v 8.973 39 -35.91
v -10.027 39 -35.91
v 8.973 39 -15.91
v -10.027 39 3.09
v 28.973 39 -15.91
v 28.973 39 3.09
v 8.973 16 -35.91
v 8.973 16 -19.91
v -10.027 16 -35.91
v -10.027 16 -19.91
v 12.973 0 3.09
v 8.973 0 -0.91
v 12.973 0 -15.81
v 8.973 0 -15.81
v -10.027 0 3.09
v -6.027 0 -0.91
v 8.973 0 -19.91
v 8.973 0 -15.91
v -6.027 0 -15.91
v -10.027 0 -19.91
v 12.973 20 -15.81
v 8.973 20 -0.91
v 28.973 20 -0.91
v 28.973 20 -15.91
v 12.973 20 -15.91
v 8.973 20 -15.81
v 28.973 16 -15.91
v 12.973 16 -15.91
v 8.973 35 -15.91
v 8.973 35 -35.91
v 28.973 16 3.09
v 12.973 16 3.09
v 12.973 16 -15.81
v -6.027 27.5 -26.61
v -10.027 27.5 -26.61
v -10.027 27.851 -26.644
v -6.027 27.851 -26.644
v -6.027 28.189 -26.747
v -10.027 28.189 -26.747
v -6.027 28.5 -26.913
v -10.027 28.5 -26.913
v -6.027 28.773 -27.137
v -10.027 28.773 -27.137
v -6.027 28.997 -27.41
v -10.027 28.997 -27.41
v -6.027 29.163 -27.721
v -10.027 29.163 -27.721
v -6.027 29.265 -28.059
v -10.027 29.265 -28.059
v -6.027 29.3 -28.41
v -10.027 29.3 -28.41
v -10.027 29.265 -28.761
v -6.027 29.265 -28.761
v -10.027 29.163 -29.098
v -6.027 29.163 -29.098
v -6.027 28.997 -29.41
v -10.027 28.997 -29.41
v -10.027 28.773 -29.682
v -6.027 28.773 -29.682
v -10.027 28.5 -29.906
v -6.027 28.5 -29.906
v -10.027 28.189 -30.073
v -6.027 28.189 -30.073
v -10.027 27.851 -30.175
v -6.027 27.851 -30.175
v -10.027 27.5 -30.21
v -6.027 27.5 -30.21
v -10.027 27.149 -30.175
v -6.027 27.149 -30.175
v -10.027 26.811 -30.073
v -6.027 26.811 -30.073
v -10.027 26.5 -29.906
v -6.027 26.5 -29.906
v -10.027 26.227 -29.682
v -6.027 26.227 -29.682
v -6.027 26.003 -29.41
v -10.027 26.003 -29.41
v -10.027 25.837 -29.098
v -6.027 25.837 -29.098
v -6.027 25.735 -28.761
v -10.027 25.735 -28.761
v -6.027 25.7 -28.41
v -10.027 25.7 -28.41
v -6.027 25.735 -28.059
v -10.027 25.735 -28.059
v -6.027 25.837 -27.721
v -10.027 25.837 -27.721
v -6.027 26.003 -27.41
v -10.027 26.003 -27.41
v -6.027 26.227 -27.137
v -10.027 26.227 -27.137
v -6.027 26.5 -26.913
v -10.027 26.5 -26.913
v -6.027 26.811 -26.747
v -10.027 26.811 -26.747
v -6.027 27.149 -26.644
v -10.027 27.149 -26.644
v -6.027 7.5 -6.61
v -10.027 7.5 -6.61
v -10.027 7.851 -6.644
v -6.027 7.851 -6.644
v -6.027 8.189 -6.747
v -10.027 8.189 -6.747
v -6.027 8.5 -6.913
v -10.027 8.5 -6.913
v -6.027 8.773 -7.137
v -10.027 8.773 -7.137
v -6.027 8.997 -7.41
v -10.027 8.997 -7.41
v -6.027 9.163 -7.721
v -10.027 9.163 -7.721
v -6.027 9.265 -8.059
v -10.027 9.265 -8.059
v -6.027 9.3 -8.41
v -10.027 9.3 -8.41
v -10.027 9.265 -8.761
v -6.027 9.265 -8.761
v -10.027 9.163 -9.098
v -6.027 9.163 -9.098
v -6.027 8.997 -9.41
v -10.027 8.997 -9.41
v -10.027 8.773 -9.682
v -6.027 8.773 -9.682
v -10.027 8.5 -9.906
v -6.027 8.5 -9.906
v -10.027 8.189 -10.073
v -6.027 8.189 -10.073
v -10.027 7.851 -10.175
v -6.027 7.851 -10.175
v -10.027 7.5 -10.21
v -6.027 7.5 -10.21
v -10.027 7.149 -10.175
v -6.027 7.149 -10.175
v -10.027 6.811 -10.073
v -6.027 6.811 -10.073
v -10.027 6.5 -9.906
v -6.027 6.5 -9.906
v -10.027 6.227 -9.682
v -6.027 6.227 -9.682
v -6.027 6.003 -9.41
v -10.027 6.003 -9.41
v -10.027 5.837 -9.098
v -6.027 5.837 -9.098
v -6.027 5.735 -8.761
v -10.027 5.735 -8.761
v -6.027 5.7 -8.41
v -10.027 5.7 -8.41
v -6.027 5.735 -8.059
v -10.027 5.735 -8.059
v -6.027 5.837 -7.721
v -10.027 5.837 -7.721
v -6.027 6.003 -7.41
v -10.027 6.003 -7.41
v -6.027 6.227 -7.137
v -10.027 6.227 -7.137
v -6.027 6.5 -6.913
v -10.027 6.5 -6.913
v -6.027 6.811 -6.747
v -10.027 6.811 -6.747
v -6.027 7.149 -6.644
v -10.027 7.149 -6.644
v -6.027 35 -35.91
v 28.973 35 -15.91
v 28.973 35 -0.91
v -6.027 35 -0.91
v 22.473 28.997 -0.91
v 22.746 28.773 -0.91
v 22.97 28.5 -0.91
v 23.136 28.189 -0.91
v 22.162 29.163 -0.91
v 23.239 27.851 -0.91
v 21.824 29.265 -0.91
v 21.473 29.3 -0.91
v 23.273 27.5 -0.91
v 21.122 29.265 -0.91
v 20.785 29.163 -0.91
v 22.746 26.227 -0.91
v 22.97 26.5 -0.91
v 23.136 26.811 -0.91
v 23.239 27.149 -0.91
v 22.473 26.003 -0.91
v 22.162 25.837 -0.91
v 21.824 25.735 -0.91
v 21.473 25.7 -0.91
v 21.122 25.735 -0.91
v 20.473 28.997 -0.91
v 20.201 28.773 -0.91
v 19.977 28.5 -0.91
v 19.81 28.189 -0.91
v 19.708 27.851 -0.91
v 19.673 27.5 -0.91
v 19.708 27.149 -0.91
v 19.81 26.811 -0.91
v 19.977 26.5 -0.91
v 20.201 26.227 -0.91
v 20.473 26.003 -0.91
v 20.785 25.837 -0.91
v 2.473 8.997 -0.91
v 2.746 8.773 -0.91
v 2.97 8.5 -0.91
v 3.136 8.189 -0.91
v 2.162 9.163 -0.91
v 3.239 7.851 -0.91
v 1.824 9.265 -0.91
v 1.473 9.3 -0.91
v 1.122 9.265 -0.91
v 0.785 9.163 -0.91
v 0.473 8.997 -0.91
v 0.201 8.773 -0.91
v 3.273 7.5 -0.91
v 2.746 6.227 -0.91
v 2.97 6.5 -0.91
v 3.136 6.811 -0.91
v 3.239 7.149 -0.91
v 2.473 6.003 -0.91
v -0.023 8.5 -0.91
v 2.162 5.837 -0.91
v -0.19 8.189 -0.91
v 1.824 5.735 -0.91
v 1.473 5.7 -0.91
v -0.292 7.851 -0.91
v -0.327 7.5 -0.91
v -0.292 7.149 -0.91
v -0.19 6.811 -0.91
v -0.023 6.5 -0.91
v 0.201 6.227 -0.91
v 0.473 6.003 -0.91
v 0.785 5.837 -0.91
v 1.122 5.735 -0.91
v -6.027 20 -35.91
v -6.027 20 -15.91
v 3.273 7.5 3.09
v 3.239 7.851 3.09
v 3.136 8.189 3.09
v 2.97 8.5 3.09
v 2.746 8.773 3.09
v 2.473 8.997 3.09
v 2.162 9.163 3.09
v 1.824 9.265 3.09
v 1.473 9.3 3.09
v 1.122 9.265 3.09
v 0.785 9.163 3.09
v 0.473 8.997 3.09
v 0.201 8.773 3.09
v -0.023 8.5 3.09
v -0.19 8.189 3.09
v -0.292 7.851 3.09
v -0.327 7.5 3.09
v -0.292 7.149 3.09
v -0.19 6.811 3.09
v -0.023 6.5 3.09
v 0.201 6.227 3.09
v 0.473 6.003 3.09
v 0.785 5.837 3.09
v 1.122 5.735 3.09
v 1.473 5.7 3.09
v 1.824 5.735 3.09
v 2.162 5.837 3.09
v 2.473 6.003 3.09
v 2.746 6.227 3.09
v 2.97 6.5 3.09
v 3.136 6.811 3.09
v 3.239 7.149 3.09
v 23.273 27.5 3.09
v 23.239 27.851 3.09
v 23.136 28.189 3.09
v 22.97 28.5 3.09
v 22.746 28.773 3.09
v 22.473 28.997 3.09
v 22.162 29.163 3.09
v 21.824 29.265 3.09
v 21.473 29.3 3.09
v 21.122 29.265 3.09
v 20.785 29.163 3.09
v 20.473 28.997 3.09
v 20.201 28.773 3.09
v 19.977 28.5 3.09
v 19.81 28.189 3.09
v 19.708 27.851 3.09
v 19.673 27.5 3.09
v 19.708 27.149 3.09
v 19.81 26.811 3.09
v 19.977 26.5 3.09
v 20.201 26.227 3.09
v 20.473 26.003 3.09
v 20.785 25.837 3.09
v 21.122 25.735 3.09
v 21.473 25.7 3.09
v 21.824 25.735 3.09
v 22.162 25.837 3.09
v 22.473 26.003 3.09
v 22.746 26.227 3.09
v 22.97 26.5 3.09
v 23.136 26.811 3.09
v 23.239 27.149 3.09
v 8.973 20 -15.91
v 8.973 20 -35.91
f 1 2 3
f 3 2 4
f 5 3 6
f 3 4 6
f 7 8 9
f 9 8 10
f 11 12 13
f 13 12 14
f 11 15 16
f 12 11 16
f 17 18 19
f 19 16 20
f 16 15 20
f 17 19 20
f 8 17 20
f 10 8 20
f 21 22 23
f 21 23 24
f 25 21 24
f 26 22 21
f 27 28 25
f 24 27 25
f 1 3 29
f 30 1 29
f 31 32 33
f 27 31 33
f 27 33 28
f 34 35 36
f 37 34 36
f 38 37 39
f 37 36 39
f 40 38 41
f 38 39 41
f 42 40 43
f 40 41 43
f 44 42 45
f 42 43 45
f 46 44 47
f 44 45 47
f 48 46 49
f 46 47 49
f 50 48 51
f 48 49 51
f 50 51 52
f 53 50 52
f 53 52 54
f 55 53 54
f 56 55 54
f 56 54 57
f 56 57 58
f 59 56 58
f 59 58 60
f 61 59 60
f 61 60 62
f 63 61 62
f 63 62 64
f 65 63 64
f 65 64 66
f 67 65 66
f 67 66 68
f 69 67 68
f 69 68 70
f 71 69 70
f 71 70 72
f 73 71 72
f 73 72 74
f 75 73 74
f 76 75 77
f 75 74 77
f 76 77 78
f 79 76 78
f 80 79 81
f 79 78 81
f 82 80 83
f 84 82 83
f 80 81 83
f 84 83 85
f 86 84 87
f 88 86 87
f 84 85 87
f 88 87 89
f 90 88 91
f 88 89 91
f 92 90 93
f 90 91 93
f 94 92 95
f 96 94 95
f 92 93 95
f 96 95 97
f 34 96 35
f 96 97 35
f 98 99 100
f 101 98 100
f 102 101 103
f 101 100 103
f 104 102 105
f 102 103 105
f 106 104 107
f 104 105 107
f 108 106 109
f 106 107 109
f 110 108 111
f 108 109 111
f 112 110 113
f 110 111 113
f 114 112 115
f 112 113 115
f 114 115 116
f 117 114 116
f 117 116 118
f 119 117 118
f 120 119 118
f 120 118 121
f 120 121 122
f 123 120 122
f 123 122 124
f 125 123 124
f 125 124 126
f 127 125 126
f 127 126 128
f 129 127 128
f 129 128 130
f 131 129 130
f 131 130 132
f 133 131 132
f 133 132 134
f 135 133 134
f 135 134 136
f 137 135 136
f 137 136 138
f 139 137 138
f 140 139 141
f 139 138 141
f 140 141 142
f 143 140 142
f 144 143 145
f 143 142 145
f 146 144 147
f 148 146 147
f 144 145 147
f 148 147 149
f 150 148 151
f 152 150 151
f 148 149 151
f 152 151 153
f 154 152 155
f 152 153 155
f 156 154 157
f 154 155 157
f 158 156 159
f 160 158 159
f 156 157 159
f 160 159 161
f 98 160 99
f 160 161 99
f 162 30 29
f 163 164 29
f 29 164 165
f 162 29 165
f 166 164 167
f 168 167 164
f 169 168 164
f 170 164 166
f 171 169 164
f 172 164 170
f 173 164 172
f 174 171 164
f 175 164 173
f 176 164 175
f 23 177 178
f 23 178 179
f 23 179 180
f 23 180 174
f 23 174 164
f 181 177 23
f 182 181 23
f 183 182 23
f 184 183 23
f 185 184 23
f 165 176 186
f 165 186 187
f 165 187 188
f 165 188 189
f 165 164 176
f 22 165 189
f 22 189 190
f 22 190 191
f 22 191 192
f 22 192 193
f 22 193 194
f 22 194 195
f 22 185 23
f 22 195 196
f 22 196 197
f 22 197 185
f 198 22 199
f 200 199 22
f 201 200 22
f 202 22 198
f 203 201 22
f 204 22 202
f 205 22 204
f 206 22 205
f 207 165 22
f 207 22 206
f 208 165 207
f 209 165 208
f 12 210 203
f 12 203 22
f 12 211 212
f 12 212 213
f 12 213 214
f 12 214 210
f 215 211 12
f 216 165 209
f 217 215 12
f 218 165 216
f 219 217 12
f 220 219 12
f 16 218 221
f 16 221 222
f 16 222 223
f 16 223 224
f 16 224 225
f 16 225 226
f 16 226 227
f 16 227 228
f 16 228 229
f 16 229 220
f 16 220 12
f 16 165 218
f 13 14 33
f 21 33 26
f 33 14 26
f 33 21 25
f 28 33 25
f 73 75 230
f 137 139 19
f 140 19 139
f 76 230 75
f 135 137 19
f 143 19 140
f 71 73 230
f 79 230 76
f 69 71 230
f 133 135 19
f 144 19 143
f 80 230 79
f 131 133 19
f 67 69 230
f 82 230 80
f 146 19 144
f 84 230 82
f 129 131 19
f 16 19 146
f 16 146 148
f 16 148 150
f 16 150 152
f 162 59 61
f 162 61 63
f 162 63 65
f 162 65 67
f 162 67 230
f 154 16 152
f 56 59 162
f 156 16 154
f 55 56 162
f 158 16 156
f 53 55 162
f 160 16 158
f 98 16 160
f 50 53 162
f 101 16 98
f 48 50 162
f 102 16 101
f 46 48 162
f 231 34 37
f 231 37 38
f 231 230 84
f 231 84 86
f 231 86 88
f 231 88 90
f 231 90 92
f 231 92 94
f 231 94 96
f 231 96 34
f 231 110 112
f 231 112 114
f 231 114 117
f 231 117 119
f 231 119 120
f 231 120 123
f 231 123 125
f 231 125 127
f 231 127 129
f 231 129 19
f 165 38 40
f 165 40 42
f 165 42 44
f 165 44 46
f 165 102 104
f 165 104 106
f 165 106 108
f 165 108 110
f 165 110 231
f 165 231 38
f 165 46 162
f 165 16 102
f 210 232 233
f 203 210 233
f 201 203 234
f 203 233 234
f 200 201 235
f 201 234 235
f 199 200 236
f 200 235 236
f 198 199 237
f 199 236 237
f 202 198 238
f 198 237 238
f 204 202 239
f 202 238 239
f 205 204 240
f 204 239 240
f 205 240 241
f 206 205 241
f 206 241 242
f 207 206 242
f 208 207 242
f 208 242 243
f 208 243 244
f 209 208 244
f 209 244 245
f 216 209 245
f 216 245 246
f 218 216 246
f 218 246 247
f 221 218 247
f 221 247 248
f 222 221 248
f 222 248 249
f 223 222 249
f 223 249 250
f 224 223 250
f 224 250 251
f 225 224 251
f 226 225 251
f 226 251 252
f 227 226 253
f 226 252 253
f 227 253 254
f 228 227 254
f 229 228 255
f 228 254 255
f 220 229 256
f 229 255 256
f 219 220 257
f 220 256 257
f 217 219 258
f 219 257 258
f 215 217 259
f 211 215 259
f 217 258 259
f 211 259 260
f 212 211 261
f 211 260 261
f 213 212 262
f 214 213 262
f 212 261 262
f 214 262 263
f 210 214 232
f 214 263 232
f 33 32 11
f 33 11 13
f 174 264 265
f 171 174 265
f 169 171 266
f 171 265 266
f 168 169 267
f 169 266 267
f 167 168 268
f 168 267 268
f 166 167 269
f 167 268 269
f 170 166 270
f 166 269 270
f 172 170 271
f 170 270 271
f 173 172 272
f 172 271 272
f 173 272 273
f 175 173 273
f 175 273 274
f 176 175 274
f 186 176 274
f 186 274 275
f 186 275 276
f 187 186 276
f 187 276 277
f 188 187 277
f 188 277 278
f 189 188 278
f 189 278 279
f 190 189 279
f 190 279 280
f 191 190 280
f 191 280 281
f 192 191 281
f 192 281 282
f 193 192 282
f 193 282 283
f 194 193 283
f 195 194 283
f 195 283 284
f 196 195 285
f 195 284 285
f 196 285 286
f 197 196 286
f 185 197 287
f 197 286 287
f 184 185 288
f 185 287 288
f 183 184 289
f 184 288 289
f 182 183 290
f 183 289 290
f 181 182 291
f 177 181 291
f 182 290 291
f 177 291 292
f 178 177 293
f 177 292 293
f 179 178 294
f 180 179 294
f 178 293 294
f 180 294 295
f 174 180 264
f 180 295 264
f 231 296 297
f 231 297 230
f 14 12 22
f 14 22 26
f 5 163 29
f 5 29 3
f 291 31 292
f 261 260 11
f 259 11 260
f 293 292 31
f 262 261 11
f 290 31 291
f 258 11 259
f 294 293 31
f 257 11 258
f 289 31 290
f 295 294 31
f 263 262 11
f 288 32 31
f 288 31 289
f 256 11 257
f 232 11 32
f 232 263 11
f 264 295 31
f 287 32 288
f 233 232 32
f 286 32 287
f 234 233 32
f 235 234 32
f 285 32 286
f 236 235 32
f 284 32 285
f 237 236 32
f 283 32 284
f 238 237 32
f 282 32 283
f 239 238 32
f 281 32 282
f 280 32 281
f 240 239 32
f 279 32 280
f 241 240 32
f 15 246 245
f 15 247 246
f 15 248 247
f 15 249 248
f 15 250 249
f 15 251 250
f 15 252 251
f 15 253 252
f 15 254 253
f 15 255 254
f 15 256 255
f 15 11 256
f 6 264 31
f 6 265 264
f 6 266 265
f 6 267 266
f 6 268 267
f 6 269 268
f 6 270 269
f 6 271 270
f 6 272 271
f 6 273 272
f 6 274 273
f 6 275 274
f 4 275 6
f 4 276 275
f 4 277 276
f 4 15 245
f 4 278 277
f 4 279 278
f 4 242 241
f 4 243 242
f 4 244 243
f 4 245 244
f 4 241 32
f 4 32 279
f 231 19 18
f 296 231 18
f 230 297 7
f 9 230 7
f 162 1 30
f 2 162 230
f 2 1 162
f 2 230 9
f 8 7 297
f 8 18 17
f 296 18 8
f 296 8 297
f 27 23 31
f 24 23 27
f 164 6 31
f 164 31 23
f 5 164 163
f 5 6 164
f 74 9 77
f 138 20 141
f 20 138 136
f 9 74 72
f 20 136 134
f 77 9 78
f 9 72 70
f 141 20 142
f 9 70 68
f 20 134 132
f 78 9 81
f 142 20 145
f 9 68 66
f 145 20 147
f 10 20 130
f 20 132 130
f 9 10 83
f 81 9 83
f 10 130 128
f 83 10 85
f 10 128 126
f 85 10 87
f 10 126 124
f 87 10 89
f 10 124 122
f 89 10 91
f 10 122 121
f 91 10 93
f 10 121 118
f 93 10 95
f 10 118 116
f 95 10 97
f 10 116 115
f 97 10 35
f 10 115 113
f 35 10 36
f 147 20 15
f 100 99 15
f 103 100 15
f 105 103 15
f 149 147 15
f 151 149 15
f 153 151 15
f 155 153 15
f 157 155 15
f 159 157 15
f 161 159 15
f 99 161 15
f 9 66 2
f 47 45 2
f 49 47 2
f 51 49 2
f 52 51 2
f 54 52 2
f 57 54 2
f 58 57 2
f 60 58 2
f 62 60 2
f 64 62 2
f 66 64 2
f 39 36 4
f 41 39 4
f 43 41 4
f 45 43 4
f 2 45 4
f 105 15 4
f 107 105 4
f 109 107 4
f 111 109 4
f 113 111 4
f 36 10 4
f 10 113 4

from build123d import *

# Parameters (mm, degrees)
EXTRUDE_1_DEPTH      = 20
SKETCH_2_W           = 18.9
SKETCH_2_H           = 20
EXTRUDE_2_DEPTH      = 4
SKETCH_3_W           = 15
SKETCH_3_H           = 4
EXTRUDE_3_DEPTH      = 39
SKETCH_4_W           = 19
SKETCH_4_H           = 4
EXTRUDE_4_DEPTH      = 16
SKETCH_5_W           = 4
SKETCH_5_H           = 15
EXTRUDE_5_DEPTH      = 20
EXTRUDE_5_DEPTH_BACK = 15
SKETCH_6_W           = 19
SKETCH_6_H           = 4
EXTRUDE_6_DEPTH      = 16
SKETCH_7_R           = 1.8
CUT_EXTRUDE_1_DEPTH  = 16
SKETCH_8_R           = 1.8
CUT_EXTRUDE_2_DEPTH  = 16
SKETCH_9_R           = 1.8
CUT_EXTRUDE_3_DEPTH  = 16


with BuildPart() as part:
    # 草图1 → 凸台-拉伸1 (new body)
    with BuildSketch(Plane(origin=(0, 0, 0), x_dir=(1, 0, 0), z_dir=(0, 1, 0))):
        Polygon((8.973333333, -3.090335191), (8.973333333, 0.909664809), (-6.026666667, 0.909664809), (-6.026666667, 15.909664809), (8.973333333, 15.909664809), (8.973333333, 19.909664809), (-4.573333333, 19.909664809), (-10.026666667, 19.909664809), (-10.026666667, 0.495974831), (-10.026666667, -3.090335191), align=None)
    extrude(amount=EXTRUDE_1_DEPTH)



with BuildPart() as body_2:
    # 草图2 → 凸台-拉伸2 (new body)
    with BuildSketch(Plane(origin=(8.973333333, 0, 0), x_dir=(0, 0, -1), z_dir=(1, 0, 0))):
        with Locations((6.359664809, 10)):
            Rectangle(SKETCH_2_W, SKETCH_2_H)
    extrude(amount=EXTRUDE_2_DEPTH)


with BuildPart() as part_1:
    add(part.part)

    add(body_2.part)  # 凸台-拉伸3 merges body 2
    # 草图3 → 凸台-拉伸3 (add)
    with BuildSketch(Plane.ZY.offset(10.026666667)):
        with Locations((-8.409664809, 37)):
            Rectangle(SKETCH_3_W, SKETCH_3_H)
        Polygon((-0.909664809, 20), (3.090335191, 20), (3.090335191, 39), (-0.909664809, 39), (-0.909664809, 35), align=None)
    extrude(amount=-EXTRUDE_3_DEPTH)

    # 草图4 → 凸台-拉伸4 (add)
    with BuildSketch(Plane(origin=(12.973333333, 0, 0), x_dir=(0, 0, -1), z_dir=(1, 0, 0))):
        with Locations((6.409664809, 18)):
            Rectangle(SKETCH_4_W, SKETCH_4_H)
    extrude(amount=EXTRUDE_4_DEPTH)

    # 草图5 → 凸台-拉伸5 (add, two sides)
    with BuildSketch(Plane(origin=(0, 0, -15.909664809), x_dir=(-1, 0, 0), z_dir=(0, 0, -1))) as extrude_5_sk:
        Polygon((6.026666667, 35), (10.026666667, 35), (10.026666667, 39), (-8.973333333, 39), (-8.973333333, 35), align=None)
        with Locations((8.026666667, 27.5)):
            Rectangle(SKETCH_5_W, SKETCH_5_H)
    extrude(amount=EXTRUDE_5_DEPTH)
    extrude(extrude_5_sk.sketch, amount=-EXTRUDE_5_DEPTH_BACK)

    # 草图6 → 凸台-拉伸6 (add)
    with BuildSketch(Plane(origin=(0, 0, -19.909664809), x_dir=(-1, 0, 0), z_dir=(0, 0, -1))):
        with Locations((0.526666667, 18)):
            Rectangle(SKETCH_6_W, SKETCH_6_H)
    extrude(amount=EXTRUDE_6_DEPTH)

    # 草图7 → 切除-拉伸1 (cut)
    with BuildSketch(Plane.XY.offset(3.090335191)):
        with Locations((21.473333333, 27.5)):
            Circle(SKETCH_7_R)
    extrude(amount=-CUT_EXTRUDE_1_DEPTH, mode=Mode.SUBTRACT)

    # 草图8 → 切除-拉伸2 (cut)
    with BuildSketch(Plane.ZY.offset(10.026666667)):
        with Locations((-28.409664809, 27.5)):
            Circle(SKETCH_8_R)
        with Locations((-8.409664809, 7.5)):
            Circle(SKETCH_8_R)
    extrude(amount=-CUT_EXTRUDE_2_DEPTH, mode=Mode.SUBTRACT)

    # 草图9 → 切除-拉伸3 (cut)
    with BuildSketch(Plane.XY.offset(3.090335191)):
        with Locations((1.473333333, 7.5)):
            Circle(SKETCH_9_R)
    extrude(amount=-CUT_EXTRUDE_3_DEPTH, mode=Mode.SUBTRACT)


solid = part_1.part
